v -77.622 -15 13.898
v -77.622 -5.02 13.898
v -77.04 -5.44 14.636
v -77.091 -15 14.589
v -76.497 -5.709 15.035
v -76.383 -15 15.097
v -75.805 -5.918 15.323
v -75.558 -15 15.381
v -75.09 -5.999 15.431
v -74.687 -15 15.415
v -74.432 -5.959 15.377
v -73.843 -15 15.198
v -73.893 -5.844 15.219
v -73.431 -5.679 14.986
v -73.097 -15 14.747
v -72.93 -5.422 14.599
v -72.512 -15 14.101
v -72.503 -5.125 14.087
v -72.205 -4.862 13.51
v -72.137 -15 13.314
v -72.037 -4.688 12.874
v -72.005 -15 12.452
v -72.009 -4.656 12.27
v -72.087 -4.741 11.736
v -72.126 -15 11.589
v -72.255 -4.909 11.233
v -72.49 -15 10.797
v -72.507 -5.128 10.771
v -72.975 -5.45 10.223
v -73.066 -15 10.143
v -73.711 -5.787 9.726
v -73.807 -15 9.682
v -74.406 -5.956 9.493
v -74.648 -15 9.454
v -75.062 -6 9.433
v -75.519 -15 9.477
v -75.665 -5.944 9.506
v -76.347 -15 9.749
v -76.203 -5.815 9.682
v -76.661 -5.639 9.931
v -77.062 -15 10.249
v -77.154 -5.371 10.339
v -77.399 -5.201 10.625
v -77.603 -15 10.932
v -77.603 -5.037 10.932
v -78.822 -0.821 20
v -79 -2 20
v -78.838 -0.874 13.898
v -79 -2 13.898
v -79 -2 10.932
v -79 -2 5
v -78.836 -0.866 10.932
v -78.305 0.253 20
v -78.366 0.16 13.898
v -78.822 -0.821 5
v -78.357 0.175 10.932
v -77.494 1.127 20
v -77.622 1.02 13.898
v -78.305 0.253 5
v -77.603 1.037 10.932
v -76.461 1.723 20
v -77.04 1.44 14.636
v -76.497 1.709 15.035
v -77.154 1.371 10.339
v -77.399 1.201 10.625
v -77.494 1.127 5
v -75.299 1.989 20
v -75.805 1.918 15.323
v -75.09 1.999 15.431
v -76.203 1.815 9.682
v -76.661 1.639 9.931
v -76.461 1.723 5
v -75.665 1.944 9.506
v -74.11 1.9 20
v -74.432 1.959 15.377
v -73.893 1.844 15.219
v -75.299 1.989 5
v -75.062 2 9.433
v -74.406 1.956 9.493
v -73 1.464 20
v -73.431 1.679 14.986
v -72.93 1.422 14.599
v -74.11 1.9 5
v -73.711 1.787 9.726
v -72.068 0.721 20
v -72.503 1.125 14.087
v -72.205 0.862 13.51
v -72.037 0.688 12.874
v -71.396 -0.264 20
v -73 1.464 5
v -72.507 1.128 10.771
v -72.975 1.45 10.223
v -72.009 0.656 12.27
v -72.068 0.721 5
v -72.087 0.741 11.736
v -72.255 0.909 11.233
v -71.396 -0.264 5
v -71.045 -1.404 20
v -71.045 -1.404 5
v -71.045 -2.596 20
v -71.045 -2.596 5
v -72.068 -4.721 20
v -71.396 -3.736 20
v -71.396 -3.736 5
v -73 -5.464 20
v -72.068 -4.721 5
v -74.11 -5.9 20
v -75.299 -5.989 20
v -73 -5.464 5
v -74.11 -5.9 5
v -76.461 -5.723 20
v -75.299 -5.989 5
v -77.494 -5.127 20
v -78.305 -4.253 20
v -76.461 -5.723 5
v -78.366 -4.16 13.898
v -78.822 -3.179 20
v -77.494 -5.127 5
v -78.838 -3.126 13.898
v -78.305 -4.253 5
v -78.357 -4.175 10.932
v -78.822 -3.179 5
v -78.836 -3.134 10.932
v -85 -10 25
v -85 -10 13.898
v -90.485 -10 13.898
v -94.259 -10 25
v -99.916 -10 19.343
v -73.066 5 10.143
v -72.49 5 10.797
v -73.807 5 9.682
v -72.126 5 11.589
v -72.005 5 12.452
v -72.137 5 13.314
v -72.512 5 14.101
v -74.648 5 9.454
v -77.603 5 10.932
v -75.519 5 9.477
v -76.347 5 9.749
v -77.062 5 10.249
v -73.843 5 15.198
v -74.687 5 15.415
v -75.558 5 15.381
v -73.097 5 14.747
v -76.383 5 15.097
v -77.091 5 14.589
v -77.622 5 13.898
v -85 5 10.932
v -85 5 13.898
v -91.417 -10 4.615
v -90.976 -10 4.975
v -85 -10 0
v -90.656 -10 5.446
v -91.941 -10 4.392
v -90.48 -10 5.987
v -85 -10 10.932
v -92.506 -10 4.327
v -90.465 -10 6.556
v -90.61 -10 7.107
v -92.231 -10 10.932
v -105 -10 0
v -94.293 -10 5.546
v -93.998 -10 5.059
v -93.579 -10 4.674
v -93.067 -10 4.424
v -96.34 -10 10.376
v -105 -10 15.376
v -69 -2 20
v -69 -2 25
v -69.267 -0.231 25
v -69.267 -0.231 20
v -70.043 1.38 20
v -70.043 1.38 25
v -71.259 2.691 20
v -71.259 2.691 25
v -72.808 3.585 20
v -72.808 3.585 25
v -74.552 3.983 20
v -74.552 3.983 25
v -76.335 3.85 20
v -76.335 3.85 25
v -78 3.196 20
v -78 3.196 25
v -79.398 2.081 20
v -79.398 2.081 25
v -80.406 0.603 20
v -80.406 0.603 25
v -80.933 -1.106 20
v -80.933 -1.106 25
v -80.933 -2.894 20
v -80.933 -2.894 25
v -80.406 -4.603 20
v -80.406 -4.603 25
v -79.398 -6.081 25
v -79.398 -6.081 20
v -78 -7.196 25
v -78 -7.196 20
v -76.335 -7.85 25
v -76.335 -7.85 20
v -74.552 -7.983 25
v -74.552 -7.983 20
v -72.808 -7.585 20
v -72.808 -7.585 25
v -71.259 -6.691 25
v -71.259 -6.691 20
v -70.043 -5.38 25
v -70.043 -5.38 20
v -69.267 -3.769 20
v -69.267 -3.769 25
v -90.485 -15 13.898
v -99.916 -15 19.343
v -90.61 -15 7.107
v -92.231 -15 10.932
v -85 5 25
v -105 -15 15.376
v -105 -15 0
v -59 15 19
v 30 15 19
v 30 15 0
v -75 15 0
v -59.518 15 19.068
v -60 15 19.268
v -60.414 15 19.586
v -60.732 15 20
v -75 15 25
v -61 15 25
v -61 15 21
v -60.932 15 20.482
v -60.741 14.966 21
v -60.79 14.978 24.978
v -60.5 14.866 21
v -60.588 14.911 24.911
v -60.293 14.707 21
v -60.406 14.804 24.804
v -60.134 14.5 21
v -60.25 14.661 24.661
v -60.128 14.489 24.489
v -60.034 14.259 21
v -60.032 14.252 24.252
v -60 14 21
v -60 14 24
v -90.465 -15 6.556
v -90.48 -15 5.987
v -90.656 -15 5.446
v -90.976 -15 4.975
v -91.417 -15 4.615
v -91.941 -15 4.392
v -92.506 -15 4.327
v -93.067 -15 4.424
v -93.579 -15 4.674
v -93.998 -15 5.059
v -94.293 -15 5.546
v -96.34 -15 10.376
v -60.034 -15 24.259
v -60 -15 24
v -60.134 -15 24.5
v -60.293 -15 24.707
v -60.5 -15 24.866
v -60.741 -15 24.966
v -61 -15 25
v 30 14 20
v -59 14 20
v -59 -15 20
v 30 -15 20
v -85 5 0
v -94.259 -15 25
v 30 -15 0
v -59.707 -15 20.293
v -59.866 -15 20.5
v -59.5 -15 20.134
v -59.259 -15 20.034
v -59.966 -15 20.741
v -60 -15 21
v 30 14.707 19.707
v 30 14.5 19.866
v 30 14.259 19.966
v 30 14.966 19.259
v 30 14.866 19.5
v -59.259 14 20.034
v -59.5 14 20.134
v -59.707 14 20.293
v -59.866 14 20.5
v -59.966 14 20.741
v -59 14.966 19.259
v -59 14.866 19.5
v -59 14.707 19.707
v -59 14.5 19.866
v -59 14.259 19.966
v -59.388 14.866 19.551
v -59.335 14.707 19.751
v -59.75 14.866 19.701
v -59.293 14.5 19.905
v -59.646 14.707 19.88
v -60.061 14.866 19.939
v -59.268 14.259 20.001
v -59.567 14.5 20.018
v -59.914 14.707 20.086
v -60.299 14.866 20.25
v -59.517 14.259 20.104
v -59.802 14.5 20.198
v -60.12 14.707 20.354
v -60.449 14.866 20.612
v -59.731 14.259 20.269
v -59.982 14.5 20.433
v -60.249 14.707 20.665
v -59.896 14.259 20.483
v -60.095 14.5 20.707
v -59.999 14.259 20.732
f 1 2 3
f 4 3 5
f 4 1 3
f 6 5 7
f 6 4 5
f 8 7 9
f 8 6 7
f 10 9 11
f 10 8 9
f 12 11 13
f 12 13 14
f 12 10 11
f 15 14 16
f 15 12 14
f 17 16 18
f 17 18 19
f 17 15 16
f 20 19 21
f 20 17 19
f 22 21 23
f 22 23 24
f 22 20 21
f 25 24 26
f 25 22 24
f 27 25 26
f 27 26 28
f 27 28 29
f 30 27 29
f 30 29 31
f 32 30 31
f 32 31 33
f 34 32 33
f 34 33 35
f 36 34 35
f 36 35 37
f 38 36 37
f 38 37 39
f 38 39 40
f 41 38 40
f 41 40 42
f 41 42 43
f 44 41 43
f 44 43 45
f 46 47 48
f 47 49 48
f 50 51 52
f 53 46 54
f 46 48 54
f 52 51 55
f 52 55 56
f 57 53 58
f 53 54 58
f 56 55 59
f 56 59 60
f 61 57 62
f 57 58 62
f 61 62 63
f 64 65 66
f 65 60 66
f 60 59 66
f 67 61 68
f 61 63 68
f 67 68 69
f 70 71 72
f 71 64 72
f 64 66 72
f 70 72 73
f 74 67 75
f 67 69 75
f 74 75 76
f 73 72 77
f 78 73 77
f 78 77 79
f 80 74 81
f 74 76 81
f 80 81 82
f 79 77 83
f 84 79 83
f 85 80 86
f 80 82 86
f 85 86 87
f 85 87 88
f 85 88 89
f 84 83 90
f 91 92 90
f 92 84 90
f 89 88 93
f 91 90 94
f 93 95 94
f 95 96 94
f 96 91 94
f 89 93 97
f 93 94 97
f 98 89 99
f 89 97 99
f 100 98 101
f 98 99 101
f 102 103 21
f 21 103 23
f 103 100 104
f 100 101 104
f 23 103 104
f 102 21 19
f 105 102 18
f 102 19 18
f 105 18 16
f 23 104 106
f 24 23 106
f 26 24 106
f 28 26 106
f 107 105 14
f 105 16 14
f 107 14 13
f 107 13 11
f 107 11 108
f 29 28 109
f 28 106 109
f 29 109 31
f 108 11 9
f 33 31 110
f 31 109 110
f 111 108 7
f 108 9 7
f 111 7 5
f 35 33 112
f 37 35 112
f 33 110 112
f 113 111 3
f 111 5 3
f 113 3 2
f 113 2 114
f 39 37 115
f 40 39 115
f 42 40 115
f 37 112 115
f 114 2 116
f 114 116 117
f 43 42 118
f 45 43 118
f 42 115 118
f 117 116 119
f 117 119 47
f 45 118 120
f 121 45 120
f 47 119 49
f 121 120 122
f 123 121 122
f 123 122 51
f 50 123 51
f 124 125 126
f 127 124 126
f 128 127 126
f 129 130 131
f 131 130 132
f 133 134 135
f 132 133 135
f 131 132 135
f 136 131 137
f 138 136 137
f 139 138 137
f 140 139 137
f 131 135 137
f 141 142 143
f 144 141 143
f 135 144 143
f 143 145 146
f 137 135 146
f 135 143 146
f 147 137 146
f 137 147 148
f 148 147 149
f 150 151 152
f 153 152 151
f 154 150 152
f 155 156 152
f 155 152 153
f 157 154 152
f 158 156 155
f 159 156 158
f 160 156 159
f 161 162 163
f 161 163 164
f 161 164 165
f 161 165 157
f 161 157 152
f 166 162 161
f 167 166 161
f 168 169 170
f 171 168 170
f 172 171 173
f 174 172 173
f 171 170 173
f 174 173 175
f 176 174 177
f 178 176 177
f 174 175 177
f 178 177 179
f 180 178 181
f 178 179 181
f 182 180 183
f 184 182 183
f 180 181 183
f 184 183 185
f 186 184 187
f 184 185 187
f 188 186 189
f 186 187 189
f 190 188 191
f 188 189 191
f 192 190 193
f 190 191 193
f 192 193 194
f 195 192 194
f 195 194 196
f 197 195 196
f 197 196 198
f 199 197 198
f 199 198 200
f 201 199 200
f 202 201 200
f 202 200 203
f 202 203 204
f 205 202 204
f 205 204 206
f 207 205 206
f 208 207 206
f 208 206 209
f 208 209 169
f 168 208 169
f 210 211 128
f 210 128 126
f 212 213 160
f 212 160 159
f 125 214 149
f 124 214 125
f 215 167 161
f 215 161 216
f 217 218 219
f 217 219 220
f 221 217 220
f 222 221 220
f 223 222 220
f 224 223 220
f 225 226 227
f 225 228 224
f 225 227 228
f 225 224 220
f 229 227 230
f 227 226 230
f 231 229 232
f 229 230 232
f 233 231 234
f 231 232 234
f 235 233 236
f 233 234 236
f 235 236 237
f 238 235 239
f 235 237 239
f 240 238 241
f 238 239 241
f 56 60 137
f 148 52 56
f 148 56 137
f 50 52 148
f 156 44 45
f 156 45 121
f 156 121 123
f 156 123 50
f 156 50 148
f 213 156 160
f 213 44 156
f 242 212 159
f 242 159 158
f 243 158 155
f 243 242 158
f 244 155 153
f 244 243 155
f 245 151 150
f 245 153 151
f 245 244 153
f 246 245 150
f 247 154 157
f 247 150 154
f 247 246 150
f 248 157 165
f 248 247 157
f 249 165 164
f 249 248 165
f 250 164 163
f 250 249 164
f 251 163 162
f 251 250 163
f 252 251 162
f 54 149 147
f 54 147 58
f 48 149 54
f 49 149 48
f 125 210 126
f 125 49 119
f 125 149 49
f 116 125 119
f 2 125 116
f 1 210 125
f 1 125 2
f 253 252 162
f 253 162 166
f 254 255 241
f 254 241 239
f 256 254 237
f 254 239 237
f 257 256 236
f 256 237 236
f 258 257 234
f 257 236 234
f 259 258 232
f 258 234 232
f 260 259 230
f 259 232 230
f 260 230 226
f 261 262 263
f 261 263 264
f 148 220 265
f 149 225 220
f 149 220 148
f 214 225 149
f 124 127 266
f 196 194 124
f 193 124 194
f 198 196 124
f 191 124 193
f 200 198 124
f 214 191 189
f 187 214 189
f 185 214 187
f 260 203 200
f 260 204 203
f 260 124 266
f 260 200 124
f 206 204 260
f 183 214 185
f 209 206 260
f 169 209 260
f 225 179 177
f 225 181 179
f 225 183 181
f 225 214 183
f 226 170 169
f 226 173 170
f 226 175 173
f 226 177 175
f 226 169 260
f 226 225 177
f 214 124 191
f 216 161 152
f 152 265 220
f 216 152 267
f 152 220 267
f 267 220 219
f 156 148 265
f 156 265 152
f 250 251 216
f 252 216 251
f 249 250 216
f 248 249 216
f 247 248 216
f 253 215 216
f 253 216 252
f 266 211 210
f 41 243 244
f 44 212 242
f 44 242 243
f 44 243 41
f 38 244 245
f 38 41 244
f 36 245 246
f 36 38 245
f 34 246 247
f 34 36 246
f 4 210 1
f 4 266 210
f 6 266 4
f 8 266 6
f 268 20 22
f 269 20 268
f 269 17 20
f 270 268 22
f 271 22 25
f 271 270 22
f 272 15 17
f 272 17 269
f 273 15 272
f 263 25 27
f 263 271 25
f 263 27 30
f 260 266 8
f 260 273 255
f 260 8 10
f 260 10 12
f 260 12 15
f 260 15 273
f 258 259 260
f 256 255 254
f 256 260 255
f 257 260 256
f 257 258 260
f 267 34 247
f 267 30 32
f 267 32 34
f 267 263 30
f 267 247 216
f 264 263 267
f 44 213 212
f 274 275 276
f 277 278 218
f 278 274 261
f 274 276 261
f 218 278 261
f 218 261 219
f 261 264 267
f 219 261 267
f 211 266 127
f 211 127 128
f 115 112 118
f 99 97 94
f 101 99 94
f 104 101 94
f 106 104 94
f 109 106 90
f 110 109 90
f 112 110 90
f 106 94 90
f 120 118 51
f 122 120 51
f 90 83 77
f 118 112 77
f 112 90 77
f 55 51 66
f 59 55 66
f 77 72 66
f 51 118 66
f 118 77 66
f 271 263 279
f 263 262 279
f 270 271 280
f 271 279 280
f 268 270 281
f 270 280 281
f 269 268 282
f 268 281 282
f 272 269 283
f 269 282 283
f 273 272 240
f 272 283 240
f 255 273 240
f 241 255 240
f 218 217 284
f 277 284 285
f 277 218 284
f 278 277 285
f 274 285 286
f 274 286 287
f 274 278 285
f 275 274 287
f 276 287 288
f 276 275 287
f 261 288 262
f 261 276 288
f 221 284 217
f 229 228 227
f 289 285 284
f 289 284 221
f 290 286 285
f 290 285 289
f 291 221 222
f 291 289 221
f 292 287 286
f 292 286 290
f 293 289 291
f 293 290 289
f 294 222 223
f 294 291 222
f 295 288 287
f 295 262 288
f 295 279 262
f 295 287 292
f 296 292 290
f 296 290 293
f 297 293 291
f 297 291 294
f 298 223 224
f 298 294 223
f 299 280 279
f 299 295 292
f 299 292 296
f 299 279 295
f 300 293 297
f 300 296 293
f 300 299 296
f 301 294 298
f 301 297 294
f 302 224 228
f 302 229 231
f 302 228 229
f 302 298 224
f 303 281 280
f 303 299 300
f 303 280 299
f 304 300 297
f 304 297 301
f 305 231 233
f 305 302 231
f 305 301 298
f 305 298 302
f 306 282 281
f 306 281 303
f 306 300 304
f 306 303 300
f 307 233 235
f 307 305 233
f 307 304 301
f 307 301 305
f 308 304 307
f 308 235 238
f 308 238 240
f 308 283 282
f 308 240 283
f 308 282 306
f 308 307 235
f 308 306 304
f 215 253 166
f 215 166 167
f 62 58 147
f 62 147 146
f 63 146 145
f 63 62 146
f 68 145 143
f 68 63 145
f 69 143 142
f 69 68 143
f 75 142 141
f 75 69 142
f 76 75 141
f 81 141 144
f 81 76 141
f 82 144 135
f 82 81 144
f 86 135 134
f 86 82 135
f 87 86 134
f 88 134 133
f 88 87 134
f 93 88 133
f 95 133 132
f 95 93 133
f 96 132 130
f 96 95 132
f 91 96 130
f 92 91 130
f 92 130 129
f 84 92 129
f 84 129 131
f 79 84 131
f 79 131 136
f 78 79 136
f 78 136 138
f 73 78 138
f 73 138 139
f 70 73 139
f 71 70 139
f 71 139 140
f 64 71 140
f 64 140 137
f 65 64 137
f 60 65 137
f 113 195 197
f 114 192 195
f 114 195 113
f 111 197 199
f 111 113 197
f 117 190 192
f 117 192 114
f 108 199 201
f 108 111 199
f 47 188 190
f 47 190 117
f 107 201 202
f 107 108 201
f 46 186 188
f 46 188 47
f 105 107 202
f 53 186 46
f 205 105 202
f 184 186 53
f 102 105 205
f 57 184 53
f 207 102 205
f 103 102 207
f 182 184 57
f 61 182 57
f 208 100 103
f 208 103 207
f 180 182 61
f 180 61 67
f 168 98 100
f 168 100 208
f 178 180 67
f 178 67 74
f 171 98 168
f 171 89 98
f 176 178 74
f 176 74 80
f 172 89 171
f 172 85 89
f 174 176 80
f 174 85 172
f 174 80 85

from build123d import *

# Parameters (mm, degrees)
SKETCH_1_W                = 110
SKETCH_1_H                = 30
EXTRUDE_1_DEPTH           = 20
EXTRUDE_2_DEPTH           = 5
EXTRUDE_2_DEPTH_BACK      = 20
FILLET_1_R                = 1
CUT_EXTRUDE_1_DEPTH       = 20
HOLE_WIZARD_1_D           = 8
HOLE_WIZARD_1_DEPTH       = 20
HOLE_WIZARD_1_CBORE_D     = 12
HOLE_WIZARD_1_CBORE_DEPTH = 5
CUT_EXTRUDE_2_REACH       = 32
SKETCH_7_W                = 20
SKETCH_7_H                = 20


with BuildPart() as part:
    # 草图1 → 凸台-拉伸1 (new body)
    with BuildSketch(Plane.XY):
        with Locations((-5, 0)):
            Rectangle(SKETCH_1_W, SKETCH_1_H)
    extrude(amount=EXTRUDE_1_DEPTH)

    # 草图3 → 凸台-拉伸2 (add, two sides)
    with BuildSketch(Plane.XY.offset(20)) as extrude_2_sk:
        Polygon((-60, -15), (-60, 15), (-75, 15), (-85, 5), (-85, -10), (-105, -10), (-105, -15), align=None)
    extrude(amount=EXTRUDE_2_DEPTH)
    extrude(extrude_2_sk.sketch, amount=-EXTRUDE_2_DEPTH_BACK)

    # 圆角1
    fillet_1_edges = [part.edges().sort_by_distance(p)[0] for p in [
        (-60, 15, 22.5),
        (-60, 0, 25),
        (-60, 0, 20),
        (-5, 15, 20),
    ]]
    fillet(fillet_1_edges, radius=FILLET_1_R)

    # 草图4 → 切除-拉伸1 (cut)
    with BuildSketch(Plane.XZ.offset(15)):
        with BuildLine():
            Line((-94.259340252, 25), (-99.916194502, 19.343145751))
            Line((-99.916194502, 19.343145751), (-90.484708185, 13.897874587))
            Line((-90.484708185, 13.897874587), (-77.622420706, 13.897874587))
            ThreePointArc((-77.622420706, 13.897874587), (-72.004883636, 12.451966115), (-77.602894826, 10.932214568))
            Line((-77.602894826, 10.932214568), (-92.230981332, 10.932214568))
            Line((-92.230981332, 10.932214568), (-90.609831702, 7.106640556))
            ThreePointArc((-90.609831702, 7.106640556), (-91.670953588, 4.484805255), (-94.292788888, 5.545927141))
            Line((-94.292788888, 5.545927141), (-96.339745962, 10.376317651))
            Line((-96.339745962, 10.376317651), (-105, 15.376317651))
            Line((-105, 15.376317651), (-105, 25))
            Line((-105, 25), (-94.259340252, 25))
        make_face()
    extrude(amount=-CUT_EXTRUDE_1_DEPTH, mode=Mode.SUBTRACT)

    # 孔1
    with Locations(Plane(origin=(-75, -2, 25), x_dir=(1, 0, 0), z_dir=(0, 0, 1))):
        with Locations((0, 0)):
            CounterBoreHole(HOLE_WIZARD_1_D / 2, HOLE_WIZARD_1_CBORE_D / 2, HOLE_WIZARD_1_CBORE_DEPTH, depth=HOLE_WIZARD_1_DEPTH)

    # 草图7 → 切除-拉伸2 (cut, up to next)
    with BuildSketch(Plane(origin=(0, -15, 0), x_dir=(-1, 0, 0), z_dir=(0, -1, 0)), mode=Mode.PRIVATE) as cut_extrude_2_sk1:
        with Locations((-40, -10)):
            Rectangle(SKETCH_7_W, SKETCH_7_H)
    cut_extrude_2_tool1 = extrude(cut_extrude_2_sk1.sketch, amount=-CUT_EXTRUDE_2_REACH, mode=Mode.PRIVATE) & part.part
    add(cut_extrude_2_tool1.solids().sort_by_distance((40, -15, 10))[0], mode=Mode.SUBTRACT)


solid = part.part
